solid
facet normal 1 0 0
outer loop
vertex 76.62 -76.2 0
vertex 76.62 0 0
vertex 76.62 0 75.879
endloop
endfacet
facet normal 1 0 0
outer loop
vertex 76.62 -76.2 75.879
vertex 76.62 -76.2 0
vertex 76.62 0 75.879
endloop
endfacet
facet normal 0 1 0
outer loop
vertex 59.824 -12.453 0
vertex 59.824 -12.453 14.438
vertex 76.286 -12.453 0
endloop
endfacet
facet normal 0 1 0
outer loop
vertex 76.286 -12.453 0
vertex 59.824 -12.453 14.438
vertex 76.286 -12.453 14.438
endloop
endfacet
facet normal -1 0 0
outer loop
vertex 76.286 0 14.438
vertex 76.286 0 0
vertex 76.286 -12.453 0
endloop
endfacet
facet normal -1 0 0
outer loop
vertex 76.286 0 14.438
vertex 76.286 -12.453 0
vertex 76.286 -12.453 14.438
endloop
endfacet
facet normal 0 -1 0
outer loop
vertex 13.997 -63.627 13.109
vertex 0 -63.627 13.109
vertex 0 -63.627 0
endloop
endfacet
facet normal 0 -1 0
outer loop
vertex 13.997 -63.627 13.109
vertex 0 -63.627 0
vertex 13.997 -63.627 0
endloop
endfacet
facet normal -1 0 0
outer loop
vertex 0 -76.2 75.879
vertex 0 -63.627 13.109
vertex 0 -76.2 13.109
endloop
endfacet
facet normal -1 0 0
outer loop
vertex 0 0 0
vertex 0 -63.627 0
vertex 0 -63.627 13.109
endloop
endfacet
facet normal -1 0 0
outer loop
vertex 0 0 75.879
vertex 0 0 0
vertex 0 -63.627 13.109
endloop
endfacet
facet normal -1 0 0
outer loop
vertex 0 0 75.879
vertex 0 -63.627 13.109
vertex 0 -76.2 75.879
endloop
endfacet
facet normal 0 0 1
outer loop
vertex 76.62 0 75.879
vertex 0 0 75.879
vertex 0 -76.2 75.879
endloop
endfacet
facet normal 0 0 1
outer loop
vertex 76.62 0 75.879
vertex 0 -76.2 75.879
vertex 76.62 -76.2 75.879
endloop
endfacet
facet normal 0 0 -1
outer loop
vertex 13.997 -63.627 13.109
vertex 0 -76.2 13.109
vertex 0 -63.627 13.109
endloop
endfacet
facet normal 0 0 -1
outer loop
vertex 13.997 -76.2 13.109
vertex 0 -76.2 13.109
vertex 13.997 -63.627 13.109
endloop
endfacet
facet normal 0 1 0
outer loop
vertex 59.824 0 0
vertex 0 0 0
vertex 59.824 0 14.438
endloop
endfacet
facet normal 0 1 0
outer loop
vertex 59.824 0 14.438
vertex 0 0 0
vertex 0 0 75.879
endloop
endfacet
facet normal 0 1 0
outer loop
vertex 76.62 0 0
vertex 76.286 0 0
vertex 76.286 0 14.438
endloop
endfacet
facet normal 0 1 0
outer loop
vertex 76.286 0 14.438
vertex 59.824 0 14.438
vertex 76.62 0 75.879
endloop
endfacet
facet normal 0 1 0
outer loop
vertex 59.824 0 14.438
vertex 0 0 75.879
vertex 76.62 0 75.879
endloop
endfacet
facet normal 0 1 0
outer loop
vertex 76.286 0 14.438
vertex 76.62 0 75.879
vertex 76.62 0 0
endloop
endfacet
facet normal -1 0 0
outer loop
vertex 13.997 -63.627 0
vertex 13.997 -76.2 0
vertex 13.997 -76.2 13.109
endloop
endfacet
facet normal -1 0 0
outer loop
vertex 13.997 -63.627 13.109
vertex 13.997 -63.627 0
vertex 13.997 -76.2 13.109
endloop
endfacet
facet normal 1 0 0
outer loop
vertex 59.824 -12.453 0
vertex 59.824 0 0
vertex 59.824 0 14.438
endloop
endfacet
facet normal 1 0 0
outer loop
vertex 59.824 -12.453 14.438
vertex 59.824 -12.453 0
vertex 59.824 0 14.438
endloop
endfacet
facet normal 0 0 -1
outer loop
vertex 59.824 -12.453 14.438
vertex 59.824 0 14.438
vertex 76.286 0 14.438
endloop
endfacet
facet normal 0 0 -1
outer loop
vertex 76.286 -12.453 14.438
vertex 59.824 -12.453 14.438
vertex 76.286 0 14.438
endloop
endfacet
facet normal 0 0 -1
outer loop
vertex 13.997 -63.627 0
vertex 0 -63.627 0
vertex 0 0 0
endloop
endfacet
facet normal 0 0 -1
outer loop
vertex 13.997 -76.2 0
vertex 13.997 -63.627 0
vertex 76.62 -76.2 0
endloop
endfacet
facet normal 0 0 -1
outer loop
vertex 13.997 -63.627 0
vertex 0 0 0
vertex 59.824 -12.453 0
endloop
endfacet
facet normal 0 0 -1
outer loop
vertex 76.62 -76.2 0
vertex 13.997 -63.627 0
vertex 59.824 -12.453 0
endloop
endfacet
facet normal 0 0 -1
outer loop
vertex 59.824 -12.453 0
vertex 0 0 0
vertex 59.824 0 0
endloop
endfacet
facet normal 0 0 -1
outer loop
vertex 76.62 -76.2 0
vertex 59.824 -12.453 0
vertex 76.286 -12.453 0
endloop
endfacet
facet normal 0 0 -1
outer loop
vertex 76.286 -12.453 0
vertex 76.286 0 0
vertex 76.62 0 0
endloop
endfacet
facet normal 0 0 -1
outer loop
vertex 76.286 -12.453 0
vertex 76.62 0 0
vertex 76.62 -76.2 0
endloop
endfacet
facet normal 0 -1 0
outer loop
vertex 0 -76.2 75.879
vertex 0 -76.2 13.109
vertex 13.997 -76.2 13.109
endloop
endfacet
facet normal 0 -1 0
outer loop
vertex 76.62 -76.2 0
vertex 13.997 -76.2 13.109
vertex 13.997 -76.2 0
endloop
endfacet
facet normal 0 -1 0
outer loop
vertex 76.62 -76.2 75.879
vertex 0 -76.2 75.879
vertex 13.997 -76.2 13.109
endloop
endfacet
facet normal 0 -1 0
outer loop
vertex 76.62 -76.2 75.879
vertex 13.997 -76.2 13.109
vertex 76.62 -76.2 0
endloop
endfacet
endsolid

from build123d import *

# Parameters (mm, degrees)
F0_W     = 76.6198411584
F0_H     = 75.8787617087
F1_DEPTH = 76.2
F2_W     = 13.9969550073
F2_H     = 13.1089836359
F3_DEPTH = 12.57318
F4_W     = 16.4612643421
F4_H     = 14.4383208826
F5_DEPTH = 12.45271


with BuildPart() as f1:
    # F0 (on Front) → F1 (new body)
    with BuildSketch(Plane.XZ):
        with Locations((38.3099205792, 37.9393808544)):
            Rectangle(F0_W, F0_H)
    extrude(amount=F1_DEPTH)

    # F2 (on face) → F3 (cut)
    with BuildSketch(Plane.XZ.offset(76.2)):
        with Locations((6.9984775037, 6.554491818)):
            Rectangle(F2_W, F2_H)
    extrude(amount=-F3_DEPTH, mode=Mode.SUBTRACT)

    # F4 (on Front) → F5 (cut)
    with BuildSketch(Plane.XZ):
        with Locations((68.0551026016, 7.2191604413)):
            Rectangle(F4_W, F4_H)
    extrude(amount=F5_DEPTH, mode=Mode.SUBTRACT)


solid = f1.part
